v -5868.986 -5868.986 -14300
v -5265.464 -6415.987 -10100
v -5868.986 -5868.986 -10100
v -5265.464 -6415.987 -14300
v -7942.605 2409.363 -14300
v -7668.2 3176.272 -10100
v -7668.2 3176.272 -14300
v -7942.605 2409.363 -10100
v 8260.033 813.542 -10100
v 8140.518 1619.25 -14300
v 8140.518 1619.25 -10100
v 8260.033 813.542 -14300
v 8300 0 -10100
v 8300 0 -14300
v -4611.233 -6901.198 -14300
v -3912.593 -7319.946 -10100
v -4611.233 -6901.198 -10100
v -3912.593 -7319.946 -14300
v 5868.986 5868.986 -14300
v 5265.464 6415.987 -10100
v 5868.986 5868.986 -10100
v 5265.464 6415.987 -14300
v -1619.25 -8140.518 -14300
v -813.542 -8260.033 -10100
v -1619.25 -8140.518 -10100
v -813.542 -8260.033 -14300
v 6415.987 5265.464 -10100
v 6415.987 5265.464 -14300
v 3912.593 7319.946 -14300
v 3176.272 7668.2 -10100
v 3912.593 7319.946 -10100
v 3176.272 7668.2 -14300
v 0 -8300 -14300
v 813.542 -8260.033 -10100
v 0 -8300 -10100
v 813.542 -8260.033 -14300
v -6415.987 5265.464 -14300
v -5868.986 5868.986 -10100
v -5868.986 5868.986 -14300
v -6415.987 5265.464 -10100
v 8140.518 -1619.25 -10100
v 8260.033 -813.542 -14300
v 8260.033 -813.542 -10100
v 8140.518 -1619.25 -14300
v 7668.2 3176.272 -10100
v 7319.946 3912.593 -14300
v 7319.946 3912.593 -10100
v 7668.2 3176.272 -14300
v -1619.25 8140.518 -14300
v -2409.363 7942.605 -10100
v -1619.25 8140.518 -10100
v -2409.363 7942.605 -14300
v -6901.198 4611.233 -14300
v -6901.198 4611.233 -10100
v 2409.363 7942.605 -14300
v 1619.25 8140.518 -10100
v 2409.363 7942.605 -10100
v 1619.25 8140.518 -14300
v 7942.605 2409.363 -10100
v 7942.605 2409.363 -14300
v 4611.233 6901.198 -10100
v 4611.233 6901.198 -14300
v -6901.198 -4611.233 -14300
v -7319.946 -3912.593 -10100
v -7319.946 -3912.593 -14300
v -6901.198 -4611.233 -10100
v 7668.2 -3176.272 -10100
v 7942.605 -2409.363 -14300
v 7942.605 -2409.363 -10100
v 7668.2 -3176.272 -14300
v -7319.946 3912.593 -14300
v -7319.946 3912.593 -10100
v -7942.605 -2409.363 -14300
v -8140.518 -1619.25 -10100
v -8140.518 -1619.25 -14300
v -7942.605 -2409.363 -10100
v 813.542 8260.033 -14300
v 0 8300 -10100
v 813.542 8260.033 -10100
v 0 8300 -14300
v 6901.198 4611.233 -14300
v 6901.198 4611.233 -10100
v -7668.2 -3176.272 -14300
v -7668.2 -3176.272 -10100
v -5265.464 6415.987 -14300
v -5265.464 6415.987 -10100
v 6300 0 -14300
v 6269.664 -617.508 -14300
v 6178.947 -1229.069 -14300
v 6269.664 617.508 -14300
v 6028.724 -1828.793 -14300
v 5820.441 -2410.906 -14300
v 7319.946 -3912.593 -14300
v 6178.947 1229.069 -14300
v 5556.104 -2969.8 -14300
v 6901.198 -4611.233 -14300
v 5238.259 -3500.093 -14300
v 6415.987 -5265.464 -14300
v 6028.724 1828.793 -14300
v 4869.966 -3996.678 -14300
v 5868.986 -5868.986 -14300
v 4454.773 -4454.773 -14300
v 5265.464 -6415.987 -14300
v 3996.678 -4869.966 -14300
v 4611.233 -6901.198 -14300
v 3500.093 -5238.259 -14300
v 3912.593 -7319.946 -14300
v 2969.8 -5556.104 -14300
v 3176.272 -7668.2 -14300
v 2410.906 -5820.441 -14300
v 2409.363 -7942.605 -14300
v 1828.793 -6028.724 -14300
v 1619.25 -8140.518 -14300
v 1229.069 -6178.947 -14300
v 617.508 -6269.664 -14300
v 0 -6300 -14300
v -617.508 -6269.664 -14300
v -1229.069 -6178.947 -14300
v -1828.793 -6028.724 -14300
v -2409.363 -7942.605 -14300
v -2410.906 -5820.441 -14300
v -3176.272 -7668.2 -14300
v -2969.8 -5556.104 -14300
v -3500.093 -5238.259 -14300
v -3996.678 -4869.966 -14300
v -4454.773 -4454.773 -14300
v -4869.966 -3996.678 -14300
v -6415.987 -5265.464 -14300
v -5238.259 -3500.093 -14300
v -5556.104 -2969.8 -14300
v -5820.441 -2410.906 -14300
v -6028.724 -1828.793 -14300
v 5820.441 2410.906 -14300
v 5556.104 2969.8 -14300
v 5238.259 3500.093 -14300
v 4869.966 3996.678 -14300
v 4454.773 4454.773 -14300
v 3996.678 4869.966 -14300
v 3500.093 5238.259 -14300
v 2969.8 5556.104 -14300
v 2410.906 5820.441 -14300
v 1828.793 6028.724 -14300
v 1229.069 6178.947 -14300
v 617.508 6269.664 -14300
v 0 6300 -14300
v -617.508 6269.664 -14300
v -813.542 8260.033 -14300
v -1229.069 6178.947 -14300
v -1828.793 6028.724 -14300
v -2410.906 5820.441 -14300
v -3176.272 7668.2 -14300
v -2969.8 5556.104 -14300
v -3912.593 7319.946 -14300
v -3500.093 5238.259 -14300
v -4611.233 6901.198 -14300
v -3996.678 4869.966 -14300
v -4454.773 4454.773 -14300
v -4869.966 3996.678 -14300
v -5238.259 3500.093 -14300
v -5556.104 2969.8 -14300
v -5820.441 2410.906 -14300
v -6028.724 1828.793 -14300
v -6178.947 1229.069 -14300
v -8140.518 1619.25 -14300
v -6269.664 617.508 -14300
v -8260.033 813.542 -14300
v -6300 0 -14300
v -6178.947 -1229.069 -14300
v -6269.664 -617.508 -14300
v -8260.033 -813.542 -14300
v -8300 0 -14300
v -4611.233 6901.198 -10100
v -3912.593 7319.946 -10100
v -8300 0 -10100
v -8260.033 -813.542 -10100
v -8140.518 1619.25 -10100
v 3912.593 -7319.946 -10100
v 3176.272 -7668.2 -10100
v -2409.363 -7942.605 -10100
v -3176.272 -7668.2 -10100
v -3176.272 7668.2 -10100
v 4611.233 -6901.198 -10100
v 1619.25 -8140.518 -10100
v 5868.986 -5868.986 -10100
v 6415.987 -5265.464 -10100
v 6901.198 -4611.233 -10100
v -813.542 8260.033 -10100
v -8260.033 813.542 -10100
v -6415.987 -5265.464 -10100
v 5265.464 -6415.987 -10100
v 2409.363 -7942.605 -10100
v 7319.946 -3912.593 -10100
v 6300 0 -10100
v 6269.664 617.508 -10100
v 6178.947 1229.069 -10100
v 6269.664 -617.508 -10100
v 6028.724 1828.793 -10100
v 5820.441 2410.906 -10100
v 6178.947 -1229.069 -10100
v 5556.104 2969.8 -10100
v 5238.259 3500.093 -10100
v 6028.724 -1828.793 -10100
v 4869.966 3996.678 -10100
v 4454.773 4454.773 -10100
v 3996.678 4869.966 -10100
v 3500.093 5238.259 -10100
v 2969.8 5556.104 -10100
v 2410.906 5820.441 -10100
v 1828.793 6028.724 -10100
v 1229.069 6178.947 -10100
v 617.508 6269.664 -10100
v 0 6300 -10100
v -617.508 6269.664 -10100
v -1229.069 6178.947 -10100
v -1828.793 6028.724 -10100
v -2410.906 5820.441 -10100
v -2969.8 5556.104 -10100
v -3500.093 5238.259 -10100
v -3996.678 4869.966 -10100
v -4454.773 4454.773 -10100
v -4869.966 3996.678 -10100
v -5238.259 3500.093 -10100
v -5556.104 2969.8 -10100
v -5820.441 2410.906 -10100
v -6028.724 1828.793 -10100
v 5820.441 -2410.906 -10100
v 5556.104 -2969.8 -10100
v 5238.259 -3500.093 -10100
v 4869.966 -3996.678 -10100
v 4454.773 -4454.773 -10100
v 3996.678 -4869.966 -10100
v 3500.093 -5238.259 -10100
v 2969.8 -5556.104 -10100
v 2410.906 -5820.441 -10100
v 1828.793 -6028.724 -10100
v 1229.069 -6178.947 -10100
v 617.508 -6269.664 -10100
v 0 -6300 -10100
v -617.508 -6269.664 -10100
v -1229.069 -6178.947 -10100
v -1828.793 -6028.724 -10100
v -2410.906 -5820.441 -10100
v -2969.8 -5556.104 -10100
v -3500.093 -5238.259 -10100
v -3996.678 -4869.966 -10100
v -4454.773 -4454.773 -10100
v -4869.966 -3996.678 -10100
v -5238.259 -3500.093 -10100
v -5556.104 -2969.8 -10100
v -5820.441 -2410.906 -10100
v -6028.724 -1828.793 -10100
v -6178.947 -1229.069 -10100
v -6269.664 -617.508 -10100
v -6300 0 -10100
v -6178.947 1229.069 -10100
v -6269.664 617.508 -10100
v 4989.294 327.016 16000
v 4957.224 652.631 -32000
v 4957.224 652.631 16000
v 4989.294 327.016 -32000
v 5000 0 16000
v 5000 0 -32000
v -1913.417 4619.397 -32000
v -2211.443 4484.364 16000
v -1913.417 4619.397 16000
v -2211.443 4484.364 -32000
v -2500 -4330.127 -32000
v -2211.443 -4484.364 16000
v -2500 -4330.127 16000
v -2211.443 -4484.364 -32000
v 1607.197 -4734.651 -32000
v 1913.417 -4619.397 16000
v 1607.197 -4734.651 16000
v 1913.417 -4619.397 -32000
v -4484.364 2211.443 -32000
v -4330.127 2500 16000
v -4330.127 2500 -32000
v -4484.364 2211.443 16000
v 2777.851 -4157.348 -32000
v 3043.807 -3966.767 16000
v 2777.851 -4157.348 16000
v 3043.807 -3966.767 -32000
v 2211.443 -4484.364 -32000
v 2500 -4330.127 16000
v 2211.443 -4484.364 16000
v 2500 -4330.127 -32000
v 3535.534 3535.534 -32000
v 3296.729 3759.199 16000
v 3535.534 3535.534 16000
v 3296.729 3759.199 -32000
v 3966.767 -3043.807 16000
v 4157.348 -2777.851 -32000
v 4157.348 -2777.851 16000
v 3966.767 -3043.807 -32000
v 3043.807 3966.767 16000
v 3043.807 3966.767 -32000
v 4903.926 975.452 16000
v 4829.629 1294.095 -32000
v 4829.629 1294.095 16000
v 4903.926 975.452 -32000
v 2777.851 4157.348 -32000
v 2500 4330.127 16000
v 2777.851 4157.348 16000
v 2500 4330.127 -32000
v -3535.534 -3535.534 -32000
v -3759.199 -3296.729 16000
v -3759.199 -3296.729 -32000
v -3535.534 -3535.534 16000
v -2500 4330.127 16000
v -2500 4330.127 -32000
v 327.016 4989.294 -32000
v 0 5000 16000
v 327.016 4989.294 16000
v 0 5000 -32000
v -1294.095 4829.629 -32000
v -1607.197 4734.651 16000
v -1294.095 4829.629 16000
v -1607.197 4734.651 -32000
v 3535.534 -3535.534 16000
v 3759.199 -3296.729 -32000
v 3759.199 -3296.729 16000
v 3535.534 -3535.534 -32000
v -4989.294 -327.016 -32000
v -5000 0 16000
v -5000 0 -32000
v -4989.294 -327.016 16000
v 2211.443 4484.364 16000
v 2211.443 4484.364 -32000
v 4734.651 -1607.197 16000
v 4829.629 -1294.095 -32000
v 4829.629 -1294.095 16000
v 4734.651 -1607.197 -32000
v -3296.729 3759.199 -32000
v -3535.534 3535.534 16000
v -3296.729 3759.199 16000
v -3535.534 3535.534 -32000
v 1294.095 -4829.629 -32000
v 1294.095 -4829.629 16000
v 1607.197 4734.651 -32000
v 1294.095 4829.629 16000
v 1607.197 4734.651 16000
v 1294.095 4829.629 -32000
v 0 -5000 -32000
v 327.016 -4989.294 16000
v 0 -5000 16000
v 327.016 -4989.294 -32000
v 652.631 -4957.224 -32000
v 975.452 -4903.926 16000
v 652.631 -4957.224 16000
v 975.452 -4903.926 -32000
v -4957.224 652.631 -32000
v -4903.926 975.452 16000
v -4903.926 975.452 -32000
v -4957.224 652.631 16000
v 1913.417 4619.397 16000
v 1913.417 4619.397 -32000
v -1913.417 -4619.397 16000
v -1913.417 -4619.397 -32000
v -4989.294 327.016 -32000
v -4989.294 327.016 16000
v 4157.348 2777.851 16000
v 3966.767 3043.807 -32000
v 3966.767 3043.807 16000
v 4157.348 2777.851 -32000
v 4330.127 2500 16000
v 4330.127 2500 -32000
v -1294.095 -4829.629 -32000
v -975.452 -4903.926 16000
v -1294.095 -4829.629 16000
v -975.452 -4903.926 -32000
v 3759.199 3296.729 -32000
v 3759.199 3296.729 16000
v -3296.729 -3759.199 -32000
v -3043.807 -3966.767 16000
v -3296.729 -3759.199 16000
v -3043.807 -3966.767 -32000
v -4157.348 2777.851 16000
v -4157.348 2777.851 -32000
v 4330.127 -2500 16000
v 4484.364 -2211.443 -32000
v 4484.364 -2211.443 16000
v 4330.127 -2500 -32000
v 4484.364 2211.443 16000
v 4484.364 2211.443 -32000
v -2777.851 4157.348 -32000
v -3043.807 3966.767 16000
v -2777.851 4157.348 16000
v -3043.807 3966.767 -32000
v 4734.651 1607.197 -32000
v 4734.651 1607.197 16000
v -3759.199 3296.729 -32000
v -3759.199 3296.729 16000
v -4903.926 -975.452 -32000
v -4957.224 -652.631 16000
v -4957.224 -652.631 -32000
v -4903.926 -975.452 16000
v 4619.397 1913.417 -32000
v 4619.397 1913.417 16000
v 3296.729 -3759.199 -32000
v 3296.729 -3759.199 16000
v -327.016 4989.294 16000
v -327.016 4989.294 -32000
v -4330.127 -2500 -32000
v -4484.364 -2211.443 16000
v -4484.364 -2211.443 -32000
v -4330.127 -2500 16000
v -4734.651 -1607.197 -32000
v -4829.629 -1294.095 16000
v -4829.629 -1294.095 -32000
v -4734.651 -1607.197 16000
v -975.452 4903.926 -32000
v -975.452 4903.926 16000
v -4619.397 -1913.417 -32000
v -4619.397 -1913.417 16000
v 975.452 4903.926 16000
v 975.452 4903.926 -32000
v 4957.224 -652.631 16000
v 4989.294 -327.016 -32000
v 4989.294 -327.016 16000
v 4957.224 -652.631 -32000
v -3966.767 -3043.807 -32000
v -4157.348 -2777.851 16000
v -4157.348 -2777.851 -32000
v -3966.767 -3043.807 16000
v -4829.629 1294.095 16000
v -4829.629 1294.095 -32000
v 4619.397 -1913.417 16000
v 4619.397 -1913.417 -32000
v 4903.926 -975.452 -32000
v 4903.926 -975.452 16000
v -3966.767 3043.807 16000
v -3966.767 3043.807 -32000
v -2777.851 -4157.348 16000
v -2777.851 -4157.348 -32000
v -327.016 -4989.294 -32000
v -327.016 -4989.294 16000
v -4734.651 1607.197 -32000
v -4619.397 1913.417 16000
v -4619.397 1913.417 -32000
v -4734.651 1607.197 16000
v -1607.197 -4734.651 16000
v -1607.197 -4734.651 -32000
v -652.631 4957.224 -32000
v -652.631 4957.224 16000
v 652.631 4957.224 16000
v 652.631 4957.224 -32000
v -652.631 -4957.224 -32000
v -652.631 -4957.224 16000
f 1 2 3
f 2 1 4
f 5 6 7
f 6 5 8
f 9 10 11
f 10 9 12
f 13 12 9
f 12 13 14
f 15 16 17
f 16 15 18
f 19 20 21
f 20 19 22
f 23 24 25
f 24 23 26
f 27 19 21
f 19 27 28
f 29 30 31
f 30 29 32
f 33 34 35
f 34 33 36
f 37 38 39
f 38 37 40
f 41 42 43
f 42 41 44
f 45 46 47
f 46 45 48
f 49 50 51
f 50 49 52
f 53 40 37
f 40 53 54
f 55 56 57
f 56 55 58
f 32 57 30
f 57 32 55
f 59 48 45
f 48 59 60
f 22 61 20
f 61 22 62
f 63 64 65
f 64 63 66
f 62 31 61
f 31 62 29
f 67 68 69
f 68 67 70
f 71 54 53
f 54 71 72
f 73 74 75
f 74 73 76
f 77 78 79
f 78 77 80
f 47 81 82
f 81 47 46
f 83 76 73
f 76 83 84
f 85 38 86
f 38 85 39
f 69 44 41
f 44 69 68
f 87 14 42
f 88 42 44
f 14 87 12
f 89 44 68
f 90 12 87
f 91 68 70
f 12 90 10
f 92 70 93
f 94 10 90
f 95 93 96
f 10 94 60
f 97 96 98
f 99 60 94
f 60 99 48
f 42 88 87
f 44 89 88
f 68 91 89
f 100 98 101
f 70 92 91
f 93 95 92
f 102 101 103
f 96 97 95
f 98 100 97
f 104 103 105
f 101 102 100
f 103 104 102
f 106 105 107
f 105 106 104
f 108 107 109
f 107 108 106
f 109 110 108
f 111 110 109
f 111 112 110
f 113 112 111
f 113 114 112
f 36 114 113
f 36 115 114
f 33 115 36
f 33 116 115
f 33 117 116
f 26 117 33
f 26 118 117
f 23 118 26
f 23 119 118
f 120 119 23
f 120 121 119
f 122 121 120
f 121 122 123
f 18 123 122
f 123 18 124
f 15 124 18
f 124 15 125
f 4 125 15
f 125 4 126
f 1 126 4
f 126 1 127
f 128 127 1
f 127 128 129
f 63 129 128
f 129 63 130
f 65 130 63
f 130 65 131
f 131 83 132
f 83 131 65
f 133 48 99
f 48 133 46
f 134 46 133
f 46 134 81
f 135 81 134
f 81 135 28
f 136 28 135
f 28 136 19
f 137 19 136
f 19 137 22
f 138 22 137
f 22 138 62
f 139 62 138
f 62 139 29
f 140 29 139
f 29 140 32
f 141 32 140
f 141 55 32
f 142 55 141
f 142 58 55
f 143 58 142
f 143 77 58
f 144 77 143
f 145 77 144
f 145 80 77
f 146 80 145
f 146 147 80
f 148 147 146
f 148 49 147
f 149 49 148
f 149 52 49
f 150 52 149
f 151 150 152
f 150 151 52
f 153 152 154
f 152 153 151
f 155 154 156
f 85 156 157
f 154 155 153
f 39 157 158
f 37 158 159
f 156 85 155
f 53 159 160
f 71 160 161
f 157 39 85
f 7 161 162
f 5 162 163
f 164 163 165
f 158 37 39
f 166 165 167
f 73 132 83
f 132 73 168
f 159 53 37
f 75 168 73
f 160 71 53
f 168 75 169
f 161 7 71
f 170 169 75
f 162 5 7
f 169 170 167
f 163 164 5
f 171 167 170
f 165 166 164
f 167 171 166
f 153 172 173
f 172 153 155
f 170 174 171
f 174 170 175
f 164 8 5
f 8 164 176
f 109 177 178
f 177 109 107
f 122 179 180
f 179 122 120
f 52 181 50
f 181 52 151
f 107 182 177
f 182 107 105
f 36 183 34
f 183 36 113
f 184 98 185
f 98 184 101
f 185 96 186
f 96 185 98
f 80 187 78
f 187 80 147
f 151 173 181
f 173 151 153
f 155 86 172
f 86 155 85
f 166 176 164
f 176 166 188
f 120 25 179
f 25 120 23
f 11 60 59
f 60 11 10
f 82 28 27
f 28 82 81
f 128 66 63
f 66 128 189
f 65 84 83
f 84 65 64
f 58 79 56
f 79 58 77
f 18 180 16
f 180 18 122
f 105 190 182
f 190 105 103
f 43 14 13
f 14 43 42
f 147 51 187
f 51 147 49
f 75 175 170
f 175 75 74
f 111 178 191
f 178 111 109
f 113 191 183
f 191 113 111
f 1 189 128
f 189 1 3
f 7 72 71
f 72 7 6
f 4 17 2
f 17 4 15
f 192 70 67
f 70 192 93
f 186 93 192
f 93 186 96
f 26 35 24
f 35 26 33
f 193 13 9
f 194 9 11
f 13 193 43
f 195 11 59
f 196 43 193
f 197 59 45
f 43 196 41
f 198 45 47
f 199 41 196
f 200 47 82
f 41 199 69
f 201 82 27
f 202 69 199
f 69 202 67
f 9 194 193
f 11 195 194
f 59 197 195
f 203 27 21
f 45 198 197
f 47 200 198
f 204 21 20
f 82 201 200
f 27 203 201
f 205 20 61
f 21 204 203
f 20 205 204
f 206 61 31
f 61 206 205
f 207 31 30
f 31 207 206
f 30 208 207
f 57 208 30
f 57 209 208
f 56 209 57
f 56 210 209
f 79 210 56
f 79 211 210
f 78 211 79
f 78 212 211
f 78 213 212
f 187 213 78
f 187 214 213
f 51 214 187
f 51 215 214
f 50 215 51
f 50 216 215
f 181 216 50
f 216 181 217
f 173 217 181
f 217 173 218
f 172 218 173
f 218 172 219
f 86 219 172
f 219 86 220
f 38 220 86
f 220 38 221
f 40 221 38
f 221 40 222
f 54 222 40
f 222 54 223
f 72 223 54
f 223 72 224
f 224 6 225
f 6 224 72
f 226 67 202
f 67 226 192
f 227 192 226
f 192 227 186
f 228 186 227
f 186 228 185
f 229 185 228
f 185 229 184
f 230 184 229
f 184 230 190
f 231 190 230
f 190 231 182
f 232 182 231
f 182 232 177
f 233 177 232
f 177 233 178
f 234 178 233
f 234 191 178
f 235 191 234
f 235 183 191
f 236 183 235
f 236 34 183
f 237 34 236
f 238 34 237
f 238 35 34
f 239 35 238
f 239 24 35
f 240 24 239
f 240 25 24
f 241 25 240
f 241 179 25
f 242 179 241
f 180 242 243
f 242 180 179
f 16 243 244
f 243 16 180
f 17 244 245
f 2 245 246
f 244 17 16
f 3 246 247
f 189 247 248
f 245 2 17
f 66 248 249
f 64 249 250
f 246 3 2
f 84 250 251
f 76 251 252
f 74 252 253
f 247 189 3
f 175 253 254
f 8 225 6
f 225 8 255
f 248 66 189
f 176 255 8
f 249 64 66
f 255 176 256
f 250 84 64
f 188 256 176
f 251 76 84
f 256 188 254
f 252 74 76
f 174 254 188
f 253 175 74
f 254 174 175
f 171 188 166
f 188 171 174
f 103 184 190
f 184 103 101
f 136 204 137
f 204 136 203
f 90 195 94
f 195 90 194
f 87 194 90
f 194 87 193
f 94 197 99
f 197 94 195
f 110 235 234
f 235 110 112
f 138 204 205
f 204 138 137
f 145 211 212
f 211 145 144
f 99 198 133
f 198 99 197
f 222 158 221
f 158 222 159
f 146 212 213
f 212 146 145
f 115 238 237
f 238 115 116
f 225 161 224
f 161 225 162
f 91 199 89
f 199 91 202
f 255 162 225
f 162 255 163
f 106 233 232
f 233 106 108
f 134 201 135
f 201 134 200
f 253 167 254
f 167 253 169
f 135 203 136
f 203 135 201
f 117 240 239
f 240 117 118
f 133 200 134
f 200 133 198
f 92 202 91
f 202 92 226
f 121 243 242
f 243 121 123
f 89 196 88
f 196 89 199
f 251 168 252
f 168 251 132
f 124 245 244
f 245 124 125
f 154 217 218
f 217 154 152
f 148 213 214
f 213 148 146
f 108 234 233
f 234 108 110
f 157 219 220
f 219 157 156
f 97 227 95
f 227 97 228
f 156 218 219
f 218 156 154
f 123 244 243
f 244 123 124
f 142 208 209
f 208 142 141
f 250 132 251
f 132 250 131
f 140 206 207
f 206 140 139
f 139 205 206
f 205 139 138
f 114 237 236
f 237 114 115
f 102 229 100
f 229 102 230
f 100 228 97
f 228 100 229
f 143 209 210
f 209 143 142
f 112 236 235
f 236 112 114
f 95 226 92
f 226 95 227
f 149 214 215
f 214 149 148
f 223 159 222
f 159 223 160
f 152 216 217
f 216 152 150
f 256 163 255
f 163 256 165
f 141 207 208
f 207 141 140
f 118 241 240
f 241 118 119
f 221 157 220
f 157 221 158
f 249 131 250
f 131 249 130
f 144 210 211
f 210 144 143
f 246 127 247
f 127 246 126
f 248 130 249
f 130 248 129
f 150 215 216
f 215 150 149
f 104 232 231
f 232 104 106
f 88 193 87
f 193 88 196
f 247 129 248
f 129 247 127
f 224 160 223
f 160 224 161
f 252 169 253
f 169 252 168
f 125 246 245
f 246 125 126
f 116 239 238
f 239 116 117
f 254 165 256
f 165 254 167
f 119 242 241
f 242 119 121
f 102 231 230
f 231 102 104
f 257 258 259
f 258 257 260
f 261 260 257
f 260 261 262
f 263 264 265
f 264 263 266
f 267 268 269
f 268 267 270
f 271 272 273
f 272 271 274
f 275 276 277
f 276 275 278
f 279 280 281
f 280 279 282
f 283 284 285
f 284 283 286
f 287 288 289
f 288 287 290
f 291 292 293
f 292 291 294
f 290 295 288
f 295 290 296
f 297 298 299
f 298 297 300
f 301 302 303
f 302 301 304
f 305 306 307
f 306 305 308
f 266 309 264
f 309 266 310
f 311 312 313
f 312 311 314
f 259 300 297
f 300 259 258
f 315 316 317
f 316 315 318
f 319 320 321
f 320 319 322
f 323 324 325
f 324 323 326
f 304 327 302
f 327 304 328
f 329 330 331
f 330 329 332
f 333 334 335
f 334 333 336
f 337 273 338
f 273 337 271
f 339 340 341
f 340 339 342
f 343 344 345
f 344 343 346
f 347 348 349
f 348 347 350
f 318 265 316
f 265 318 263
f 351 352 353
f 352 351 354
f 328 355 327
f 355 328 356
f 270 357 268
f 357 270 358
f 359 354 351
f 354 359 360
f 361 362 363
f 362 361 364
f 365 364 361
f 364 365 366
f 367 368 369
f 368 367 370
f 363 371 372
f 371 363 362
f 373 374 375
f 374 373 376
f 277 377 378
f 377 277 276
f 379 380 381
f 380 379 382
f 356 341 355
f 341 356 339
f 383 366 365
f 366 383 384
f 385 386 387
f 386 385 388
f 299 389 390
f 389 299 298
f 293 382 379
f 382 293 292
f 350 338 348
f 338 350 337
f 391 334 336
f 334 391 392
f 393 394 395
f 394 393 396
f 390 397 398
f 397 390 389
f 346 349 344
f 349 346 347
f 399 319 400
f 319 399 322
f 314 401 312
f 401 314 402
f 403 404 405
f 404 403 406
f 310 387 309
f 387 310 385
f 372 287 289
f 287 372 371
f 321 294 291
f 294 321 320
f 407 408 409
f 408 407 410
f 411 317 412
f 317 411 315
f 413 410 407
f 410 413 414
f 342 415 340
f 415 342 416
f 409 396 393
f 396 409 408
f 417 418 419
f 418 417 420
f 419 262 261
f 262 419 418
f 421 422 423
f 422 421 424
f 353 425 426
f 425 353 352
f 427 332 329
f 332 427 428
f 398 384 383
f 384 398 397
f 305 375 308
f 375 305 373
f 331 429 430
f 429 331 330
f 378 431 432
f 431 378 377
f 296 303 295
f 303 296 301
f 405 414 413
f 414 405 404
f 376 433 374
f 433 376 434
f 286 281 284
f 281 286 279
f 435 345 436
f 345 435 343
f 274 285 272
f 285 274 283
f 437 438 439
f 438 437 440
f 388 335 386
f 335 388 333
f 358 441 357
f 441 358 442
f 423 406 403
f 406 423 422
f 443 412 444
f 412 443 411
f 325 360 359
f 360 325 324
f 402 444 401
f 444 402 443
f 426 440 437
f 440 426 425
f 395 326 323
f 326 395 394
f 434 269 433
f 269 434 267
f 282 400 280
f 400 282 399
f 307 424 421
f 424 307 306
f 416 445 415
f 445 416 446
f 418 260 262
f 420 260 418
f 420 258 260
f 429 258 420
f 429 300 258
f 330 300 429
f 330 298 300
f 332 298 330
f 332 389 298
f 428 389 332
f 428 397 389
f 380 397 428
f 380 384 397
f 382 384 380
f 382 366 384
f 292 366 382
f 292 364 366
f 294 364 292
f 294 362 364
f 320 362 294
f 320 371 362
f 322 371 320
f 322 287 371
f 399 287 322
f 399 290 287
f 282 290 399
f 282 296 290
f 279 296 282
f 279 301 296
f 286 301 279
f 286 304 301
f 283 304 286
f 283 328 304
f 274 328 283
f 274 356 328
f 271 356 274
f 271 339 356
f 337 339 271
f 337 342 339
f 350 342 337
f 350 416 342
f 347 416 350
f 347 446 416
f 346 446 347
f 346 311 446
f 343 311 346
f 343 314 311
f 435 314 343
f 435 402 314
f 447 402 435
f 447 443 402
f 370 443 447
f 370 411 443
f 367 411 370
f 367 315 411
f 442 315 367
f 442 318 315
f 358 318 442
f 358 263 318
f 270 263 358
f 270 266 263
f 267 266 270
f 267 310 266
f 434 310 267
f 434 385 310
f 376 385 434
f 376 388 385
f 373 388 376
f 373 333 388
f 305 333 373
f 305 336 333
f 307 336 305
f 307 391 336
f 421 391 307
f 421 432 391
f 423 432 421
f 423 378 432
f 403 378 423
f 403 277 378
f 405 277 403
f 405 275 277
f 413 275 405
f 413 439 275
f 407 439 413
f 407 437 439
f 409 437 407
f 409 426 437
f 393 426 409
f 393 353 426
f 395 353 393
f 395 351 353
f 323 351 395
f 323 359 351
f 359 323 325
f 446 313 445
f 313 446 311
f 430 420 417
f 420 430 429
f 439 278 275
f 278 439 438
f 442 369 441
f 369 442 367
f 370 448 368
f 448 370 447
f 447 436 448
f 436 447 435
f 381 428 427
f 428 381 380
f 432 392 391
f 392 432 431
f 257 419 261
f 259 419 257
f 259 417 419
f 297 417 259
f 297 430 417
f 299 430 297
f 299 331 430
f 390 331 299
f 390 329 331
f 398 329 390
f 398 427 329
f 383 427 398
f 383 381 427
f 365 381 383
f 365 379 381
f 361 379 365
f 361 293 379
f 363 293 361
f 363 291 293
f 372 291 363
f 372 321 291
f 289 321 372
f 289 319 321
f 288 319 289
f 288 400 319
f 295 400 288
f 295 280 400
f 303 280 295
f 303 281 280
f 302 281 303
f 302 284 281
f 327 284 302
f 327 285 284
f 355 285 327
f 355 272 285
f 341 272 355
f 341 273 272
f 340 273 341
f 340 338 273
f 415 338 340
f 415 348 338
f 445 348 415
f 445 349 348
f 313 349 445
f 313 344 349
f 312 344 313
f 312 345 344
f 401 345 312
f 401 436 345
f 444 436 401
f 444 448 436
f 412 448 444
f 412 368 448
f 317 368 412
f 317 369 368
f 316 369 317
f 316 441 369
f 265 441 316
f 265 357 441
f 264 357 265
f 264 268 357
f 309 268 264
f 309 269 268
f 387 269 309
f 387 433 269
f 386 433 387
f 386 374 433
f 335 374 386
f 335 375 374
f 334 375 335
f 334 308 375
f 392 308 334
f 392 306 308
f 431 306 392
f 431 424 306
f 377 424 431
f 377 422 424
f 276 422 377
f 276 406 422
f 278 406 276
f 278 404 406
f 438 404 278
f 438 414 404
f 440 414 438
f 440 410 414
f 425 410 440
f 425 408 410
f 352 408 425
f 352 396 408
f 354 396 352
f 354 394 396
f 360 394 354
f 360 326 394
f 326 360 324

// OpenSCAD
// 装配顺序 ①：桥墩 + 浮箱安装
$vpt = [0, 0, -2000];
$vpr = [60, 0, 40];
$vpd = 140000;  // 视口预设：打开后按 F5 即定位到模型


include <anticollision_lib.scad>

assembly_stage(1);
